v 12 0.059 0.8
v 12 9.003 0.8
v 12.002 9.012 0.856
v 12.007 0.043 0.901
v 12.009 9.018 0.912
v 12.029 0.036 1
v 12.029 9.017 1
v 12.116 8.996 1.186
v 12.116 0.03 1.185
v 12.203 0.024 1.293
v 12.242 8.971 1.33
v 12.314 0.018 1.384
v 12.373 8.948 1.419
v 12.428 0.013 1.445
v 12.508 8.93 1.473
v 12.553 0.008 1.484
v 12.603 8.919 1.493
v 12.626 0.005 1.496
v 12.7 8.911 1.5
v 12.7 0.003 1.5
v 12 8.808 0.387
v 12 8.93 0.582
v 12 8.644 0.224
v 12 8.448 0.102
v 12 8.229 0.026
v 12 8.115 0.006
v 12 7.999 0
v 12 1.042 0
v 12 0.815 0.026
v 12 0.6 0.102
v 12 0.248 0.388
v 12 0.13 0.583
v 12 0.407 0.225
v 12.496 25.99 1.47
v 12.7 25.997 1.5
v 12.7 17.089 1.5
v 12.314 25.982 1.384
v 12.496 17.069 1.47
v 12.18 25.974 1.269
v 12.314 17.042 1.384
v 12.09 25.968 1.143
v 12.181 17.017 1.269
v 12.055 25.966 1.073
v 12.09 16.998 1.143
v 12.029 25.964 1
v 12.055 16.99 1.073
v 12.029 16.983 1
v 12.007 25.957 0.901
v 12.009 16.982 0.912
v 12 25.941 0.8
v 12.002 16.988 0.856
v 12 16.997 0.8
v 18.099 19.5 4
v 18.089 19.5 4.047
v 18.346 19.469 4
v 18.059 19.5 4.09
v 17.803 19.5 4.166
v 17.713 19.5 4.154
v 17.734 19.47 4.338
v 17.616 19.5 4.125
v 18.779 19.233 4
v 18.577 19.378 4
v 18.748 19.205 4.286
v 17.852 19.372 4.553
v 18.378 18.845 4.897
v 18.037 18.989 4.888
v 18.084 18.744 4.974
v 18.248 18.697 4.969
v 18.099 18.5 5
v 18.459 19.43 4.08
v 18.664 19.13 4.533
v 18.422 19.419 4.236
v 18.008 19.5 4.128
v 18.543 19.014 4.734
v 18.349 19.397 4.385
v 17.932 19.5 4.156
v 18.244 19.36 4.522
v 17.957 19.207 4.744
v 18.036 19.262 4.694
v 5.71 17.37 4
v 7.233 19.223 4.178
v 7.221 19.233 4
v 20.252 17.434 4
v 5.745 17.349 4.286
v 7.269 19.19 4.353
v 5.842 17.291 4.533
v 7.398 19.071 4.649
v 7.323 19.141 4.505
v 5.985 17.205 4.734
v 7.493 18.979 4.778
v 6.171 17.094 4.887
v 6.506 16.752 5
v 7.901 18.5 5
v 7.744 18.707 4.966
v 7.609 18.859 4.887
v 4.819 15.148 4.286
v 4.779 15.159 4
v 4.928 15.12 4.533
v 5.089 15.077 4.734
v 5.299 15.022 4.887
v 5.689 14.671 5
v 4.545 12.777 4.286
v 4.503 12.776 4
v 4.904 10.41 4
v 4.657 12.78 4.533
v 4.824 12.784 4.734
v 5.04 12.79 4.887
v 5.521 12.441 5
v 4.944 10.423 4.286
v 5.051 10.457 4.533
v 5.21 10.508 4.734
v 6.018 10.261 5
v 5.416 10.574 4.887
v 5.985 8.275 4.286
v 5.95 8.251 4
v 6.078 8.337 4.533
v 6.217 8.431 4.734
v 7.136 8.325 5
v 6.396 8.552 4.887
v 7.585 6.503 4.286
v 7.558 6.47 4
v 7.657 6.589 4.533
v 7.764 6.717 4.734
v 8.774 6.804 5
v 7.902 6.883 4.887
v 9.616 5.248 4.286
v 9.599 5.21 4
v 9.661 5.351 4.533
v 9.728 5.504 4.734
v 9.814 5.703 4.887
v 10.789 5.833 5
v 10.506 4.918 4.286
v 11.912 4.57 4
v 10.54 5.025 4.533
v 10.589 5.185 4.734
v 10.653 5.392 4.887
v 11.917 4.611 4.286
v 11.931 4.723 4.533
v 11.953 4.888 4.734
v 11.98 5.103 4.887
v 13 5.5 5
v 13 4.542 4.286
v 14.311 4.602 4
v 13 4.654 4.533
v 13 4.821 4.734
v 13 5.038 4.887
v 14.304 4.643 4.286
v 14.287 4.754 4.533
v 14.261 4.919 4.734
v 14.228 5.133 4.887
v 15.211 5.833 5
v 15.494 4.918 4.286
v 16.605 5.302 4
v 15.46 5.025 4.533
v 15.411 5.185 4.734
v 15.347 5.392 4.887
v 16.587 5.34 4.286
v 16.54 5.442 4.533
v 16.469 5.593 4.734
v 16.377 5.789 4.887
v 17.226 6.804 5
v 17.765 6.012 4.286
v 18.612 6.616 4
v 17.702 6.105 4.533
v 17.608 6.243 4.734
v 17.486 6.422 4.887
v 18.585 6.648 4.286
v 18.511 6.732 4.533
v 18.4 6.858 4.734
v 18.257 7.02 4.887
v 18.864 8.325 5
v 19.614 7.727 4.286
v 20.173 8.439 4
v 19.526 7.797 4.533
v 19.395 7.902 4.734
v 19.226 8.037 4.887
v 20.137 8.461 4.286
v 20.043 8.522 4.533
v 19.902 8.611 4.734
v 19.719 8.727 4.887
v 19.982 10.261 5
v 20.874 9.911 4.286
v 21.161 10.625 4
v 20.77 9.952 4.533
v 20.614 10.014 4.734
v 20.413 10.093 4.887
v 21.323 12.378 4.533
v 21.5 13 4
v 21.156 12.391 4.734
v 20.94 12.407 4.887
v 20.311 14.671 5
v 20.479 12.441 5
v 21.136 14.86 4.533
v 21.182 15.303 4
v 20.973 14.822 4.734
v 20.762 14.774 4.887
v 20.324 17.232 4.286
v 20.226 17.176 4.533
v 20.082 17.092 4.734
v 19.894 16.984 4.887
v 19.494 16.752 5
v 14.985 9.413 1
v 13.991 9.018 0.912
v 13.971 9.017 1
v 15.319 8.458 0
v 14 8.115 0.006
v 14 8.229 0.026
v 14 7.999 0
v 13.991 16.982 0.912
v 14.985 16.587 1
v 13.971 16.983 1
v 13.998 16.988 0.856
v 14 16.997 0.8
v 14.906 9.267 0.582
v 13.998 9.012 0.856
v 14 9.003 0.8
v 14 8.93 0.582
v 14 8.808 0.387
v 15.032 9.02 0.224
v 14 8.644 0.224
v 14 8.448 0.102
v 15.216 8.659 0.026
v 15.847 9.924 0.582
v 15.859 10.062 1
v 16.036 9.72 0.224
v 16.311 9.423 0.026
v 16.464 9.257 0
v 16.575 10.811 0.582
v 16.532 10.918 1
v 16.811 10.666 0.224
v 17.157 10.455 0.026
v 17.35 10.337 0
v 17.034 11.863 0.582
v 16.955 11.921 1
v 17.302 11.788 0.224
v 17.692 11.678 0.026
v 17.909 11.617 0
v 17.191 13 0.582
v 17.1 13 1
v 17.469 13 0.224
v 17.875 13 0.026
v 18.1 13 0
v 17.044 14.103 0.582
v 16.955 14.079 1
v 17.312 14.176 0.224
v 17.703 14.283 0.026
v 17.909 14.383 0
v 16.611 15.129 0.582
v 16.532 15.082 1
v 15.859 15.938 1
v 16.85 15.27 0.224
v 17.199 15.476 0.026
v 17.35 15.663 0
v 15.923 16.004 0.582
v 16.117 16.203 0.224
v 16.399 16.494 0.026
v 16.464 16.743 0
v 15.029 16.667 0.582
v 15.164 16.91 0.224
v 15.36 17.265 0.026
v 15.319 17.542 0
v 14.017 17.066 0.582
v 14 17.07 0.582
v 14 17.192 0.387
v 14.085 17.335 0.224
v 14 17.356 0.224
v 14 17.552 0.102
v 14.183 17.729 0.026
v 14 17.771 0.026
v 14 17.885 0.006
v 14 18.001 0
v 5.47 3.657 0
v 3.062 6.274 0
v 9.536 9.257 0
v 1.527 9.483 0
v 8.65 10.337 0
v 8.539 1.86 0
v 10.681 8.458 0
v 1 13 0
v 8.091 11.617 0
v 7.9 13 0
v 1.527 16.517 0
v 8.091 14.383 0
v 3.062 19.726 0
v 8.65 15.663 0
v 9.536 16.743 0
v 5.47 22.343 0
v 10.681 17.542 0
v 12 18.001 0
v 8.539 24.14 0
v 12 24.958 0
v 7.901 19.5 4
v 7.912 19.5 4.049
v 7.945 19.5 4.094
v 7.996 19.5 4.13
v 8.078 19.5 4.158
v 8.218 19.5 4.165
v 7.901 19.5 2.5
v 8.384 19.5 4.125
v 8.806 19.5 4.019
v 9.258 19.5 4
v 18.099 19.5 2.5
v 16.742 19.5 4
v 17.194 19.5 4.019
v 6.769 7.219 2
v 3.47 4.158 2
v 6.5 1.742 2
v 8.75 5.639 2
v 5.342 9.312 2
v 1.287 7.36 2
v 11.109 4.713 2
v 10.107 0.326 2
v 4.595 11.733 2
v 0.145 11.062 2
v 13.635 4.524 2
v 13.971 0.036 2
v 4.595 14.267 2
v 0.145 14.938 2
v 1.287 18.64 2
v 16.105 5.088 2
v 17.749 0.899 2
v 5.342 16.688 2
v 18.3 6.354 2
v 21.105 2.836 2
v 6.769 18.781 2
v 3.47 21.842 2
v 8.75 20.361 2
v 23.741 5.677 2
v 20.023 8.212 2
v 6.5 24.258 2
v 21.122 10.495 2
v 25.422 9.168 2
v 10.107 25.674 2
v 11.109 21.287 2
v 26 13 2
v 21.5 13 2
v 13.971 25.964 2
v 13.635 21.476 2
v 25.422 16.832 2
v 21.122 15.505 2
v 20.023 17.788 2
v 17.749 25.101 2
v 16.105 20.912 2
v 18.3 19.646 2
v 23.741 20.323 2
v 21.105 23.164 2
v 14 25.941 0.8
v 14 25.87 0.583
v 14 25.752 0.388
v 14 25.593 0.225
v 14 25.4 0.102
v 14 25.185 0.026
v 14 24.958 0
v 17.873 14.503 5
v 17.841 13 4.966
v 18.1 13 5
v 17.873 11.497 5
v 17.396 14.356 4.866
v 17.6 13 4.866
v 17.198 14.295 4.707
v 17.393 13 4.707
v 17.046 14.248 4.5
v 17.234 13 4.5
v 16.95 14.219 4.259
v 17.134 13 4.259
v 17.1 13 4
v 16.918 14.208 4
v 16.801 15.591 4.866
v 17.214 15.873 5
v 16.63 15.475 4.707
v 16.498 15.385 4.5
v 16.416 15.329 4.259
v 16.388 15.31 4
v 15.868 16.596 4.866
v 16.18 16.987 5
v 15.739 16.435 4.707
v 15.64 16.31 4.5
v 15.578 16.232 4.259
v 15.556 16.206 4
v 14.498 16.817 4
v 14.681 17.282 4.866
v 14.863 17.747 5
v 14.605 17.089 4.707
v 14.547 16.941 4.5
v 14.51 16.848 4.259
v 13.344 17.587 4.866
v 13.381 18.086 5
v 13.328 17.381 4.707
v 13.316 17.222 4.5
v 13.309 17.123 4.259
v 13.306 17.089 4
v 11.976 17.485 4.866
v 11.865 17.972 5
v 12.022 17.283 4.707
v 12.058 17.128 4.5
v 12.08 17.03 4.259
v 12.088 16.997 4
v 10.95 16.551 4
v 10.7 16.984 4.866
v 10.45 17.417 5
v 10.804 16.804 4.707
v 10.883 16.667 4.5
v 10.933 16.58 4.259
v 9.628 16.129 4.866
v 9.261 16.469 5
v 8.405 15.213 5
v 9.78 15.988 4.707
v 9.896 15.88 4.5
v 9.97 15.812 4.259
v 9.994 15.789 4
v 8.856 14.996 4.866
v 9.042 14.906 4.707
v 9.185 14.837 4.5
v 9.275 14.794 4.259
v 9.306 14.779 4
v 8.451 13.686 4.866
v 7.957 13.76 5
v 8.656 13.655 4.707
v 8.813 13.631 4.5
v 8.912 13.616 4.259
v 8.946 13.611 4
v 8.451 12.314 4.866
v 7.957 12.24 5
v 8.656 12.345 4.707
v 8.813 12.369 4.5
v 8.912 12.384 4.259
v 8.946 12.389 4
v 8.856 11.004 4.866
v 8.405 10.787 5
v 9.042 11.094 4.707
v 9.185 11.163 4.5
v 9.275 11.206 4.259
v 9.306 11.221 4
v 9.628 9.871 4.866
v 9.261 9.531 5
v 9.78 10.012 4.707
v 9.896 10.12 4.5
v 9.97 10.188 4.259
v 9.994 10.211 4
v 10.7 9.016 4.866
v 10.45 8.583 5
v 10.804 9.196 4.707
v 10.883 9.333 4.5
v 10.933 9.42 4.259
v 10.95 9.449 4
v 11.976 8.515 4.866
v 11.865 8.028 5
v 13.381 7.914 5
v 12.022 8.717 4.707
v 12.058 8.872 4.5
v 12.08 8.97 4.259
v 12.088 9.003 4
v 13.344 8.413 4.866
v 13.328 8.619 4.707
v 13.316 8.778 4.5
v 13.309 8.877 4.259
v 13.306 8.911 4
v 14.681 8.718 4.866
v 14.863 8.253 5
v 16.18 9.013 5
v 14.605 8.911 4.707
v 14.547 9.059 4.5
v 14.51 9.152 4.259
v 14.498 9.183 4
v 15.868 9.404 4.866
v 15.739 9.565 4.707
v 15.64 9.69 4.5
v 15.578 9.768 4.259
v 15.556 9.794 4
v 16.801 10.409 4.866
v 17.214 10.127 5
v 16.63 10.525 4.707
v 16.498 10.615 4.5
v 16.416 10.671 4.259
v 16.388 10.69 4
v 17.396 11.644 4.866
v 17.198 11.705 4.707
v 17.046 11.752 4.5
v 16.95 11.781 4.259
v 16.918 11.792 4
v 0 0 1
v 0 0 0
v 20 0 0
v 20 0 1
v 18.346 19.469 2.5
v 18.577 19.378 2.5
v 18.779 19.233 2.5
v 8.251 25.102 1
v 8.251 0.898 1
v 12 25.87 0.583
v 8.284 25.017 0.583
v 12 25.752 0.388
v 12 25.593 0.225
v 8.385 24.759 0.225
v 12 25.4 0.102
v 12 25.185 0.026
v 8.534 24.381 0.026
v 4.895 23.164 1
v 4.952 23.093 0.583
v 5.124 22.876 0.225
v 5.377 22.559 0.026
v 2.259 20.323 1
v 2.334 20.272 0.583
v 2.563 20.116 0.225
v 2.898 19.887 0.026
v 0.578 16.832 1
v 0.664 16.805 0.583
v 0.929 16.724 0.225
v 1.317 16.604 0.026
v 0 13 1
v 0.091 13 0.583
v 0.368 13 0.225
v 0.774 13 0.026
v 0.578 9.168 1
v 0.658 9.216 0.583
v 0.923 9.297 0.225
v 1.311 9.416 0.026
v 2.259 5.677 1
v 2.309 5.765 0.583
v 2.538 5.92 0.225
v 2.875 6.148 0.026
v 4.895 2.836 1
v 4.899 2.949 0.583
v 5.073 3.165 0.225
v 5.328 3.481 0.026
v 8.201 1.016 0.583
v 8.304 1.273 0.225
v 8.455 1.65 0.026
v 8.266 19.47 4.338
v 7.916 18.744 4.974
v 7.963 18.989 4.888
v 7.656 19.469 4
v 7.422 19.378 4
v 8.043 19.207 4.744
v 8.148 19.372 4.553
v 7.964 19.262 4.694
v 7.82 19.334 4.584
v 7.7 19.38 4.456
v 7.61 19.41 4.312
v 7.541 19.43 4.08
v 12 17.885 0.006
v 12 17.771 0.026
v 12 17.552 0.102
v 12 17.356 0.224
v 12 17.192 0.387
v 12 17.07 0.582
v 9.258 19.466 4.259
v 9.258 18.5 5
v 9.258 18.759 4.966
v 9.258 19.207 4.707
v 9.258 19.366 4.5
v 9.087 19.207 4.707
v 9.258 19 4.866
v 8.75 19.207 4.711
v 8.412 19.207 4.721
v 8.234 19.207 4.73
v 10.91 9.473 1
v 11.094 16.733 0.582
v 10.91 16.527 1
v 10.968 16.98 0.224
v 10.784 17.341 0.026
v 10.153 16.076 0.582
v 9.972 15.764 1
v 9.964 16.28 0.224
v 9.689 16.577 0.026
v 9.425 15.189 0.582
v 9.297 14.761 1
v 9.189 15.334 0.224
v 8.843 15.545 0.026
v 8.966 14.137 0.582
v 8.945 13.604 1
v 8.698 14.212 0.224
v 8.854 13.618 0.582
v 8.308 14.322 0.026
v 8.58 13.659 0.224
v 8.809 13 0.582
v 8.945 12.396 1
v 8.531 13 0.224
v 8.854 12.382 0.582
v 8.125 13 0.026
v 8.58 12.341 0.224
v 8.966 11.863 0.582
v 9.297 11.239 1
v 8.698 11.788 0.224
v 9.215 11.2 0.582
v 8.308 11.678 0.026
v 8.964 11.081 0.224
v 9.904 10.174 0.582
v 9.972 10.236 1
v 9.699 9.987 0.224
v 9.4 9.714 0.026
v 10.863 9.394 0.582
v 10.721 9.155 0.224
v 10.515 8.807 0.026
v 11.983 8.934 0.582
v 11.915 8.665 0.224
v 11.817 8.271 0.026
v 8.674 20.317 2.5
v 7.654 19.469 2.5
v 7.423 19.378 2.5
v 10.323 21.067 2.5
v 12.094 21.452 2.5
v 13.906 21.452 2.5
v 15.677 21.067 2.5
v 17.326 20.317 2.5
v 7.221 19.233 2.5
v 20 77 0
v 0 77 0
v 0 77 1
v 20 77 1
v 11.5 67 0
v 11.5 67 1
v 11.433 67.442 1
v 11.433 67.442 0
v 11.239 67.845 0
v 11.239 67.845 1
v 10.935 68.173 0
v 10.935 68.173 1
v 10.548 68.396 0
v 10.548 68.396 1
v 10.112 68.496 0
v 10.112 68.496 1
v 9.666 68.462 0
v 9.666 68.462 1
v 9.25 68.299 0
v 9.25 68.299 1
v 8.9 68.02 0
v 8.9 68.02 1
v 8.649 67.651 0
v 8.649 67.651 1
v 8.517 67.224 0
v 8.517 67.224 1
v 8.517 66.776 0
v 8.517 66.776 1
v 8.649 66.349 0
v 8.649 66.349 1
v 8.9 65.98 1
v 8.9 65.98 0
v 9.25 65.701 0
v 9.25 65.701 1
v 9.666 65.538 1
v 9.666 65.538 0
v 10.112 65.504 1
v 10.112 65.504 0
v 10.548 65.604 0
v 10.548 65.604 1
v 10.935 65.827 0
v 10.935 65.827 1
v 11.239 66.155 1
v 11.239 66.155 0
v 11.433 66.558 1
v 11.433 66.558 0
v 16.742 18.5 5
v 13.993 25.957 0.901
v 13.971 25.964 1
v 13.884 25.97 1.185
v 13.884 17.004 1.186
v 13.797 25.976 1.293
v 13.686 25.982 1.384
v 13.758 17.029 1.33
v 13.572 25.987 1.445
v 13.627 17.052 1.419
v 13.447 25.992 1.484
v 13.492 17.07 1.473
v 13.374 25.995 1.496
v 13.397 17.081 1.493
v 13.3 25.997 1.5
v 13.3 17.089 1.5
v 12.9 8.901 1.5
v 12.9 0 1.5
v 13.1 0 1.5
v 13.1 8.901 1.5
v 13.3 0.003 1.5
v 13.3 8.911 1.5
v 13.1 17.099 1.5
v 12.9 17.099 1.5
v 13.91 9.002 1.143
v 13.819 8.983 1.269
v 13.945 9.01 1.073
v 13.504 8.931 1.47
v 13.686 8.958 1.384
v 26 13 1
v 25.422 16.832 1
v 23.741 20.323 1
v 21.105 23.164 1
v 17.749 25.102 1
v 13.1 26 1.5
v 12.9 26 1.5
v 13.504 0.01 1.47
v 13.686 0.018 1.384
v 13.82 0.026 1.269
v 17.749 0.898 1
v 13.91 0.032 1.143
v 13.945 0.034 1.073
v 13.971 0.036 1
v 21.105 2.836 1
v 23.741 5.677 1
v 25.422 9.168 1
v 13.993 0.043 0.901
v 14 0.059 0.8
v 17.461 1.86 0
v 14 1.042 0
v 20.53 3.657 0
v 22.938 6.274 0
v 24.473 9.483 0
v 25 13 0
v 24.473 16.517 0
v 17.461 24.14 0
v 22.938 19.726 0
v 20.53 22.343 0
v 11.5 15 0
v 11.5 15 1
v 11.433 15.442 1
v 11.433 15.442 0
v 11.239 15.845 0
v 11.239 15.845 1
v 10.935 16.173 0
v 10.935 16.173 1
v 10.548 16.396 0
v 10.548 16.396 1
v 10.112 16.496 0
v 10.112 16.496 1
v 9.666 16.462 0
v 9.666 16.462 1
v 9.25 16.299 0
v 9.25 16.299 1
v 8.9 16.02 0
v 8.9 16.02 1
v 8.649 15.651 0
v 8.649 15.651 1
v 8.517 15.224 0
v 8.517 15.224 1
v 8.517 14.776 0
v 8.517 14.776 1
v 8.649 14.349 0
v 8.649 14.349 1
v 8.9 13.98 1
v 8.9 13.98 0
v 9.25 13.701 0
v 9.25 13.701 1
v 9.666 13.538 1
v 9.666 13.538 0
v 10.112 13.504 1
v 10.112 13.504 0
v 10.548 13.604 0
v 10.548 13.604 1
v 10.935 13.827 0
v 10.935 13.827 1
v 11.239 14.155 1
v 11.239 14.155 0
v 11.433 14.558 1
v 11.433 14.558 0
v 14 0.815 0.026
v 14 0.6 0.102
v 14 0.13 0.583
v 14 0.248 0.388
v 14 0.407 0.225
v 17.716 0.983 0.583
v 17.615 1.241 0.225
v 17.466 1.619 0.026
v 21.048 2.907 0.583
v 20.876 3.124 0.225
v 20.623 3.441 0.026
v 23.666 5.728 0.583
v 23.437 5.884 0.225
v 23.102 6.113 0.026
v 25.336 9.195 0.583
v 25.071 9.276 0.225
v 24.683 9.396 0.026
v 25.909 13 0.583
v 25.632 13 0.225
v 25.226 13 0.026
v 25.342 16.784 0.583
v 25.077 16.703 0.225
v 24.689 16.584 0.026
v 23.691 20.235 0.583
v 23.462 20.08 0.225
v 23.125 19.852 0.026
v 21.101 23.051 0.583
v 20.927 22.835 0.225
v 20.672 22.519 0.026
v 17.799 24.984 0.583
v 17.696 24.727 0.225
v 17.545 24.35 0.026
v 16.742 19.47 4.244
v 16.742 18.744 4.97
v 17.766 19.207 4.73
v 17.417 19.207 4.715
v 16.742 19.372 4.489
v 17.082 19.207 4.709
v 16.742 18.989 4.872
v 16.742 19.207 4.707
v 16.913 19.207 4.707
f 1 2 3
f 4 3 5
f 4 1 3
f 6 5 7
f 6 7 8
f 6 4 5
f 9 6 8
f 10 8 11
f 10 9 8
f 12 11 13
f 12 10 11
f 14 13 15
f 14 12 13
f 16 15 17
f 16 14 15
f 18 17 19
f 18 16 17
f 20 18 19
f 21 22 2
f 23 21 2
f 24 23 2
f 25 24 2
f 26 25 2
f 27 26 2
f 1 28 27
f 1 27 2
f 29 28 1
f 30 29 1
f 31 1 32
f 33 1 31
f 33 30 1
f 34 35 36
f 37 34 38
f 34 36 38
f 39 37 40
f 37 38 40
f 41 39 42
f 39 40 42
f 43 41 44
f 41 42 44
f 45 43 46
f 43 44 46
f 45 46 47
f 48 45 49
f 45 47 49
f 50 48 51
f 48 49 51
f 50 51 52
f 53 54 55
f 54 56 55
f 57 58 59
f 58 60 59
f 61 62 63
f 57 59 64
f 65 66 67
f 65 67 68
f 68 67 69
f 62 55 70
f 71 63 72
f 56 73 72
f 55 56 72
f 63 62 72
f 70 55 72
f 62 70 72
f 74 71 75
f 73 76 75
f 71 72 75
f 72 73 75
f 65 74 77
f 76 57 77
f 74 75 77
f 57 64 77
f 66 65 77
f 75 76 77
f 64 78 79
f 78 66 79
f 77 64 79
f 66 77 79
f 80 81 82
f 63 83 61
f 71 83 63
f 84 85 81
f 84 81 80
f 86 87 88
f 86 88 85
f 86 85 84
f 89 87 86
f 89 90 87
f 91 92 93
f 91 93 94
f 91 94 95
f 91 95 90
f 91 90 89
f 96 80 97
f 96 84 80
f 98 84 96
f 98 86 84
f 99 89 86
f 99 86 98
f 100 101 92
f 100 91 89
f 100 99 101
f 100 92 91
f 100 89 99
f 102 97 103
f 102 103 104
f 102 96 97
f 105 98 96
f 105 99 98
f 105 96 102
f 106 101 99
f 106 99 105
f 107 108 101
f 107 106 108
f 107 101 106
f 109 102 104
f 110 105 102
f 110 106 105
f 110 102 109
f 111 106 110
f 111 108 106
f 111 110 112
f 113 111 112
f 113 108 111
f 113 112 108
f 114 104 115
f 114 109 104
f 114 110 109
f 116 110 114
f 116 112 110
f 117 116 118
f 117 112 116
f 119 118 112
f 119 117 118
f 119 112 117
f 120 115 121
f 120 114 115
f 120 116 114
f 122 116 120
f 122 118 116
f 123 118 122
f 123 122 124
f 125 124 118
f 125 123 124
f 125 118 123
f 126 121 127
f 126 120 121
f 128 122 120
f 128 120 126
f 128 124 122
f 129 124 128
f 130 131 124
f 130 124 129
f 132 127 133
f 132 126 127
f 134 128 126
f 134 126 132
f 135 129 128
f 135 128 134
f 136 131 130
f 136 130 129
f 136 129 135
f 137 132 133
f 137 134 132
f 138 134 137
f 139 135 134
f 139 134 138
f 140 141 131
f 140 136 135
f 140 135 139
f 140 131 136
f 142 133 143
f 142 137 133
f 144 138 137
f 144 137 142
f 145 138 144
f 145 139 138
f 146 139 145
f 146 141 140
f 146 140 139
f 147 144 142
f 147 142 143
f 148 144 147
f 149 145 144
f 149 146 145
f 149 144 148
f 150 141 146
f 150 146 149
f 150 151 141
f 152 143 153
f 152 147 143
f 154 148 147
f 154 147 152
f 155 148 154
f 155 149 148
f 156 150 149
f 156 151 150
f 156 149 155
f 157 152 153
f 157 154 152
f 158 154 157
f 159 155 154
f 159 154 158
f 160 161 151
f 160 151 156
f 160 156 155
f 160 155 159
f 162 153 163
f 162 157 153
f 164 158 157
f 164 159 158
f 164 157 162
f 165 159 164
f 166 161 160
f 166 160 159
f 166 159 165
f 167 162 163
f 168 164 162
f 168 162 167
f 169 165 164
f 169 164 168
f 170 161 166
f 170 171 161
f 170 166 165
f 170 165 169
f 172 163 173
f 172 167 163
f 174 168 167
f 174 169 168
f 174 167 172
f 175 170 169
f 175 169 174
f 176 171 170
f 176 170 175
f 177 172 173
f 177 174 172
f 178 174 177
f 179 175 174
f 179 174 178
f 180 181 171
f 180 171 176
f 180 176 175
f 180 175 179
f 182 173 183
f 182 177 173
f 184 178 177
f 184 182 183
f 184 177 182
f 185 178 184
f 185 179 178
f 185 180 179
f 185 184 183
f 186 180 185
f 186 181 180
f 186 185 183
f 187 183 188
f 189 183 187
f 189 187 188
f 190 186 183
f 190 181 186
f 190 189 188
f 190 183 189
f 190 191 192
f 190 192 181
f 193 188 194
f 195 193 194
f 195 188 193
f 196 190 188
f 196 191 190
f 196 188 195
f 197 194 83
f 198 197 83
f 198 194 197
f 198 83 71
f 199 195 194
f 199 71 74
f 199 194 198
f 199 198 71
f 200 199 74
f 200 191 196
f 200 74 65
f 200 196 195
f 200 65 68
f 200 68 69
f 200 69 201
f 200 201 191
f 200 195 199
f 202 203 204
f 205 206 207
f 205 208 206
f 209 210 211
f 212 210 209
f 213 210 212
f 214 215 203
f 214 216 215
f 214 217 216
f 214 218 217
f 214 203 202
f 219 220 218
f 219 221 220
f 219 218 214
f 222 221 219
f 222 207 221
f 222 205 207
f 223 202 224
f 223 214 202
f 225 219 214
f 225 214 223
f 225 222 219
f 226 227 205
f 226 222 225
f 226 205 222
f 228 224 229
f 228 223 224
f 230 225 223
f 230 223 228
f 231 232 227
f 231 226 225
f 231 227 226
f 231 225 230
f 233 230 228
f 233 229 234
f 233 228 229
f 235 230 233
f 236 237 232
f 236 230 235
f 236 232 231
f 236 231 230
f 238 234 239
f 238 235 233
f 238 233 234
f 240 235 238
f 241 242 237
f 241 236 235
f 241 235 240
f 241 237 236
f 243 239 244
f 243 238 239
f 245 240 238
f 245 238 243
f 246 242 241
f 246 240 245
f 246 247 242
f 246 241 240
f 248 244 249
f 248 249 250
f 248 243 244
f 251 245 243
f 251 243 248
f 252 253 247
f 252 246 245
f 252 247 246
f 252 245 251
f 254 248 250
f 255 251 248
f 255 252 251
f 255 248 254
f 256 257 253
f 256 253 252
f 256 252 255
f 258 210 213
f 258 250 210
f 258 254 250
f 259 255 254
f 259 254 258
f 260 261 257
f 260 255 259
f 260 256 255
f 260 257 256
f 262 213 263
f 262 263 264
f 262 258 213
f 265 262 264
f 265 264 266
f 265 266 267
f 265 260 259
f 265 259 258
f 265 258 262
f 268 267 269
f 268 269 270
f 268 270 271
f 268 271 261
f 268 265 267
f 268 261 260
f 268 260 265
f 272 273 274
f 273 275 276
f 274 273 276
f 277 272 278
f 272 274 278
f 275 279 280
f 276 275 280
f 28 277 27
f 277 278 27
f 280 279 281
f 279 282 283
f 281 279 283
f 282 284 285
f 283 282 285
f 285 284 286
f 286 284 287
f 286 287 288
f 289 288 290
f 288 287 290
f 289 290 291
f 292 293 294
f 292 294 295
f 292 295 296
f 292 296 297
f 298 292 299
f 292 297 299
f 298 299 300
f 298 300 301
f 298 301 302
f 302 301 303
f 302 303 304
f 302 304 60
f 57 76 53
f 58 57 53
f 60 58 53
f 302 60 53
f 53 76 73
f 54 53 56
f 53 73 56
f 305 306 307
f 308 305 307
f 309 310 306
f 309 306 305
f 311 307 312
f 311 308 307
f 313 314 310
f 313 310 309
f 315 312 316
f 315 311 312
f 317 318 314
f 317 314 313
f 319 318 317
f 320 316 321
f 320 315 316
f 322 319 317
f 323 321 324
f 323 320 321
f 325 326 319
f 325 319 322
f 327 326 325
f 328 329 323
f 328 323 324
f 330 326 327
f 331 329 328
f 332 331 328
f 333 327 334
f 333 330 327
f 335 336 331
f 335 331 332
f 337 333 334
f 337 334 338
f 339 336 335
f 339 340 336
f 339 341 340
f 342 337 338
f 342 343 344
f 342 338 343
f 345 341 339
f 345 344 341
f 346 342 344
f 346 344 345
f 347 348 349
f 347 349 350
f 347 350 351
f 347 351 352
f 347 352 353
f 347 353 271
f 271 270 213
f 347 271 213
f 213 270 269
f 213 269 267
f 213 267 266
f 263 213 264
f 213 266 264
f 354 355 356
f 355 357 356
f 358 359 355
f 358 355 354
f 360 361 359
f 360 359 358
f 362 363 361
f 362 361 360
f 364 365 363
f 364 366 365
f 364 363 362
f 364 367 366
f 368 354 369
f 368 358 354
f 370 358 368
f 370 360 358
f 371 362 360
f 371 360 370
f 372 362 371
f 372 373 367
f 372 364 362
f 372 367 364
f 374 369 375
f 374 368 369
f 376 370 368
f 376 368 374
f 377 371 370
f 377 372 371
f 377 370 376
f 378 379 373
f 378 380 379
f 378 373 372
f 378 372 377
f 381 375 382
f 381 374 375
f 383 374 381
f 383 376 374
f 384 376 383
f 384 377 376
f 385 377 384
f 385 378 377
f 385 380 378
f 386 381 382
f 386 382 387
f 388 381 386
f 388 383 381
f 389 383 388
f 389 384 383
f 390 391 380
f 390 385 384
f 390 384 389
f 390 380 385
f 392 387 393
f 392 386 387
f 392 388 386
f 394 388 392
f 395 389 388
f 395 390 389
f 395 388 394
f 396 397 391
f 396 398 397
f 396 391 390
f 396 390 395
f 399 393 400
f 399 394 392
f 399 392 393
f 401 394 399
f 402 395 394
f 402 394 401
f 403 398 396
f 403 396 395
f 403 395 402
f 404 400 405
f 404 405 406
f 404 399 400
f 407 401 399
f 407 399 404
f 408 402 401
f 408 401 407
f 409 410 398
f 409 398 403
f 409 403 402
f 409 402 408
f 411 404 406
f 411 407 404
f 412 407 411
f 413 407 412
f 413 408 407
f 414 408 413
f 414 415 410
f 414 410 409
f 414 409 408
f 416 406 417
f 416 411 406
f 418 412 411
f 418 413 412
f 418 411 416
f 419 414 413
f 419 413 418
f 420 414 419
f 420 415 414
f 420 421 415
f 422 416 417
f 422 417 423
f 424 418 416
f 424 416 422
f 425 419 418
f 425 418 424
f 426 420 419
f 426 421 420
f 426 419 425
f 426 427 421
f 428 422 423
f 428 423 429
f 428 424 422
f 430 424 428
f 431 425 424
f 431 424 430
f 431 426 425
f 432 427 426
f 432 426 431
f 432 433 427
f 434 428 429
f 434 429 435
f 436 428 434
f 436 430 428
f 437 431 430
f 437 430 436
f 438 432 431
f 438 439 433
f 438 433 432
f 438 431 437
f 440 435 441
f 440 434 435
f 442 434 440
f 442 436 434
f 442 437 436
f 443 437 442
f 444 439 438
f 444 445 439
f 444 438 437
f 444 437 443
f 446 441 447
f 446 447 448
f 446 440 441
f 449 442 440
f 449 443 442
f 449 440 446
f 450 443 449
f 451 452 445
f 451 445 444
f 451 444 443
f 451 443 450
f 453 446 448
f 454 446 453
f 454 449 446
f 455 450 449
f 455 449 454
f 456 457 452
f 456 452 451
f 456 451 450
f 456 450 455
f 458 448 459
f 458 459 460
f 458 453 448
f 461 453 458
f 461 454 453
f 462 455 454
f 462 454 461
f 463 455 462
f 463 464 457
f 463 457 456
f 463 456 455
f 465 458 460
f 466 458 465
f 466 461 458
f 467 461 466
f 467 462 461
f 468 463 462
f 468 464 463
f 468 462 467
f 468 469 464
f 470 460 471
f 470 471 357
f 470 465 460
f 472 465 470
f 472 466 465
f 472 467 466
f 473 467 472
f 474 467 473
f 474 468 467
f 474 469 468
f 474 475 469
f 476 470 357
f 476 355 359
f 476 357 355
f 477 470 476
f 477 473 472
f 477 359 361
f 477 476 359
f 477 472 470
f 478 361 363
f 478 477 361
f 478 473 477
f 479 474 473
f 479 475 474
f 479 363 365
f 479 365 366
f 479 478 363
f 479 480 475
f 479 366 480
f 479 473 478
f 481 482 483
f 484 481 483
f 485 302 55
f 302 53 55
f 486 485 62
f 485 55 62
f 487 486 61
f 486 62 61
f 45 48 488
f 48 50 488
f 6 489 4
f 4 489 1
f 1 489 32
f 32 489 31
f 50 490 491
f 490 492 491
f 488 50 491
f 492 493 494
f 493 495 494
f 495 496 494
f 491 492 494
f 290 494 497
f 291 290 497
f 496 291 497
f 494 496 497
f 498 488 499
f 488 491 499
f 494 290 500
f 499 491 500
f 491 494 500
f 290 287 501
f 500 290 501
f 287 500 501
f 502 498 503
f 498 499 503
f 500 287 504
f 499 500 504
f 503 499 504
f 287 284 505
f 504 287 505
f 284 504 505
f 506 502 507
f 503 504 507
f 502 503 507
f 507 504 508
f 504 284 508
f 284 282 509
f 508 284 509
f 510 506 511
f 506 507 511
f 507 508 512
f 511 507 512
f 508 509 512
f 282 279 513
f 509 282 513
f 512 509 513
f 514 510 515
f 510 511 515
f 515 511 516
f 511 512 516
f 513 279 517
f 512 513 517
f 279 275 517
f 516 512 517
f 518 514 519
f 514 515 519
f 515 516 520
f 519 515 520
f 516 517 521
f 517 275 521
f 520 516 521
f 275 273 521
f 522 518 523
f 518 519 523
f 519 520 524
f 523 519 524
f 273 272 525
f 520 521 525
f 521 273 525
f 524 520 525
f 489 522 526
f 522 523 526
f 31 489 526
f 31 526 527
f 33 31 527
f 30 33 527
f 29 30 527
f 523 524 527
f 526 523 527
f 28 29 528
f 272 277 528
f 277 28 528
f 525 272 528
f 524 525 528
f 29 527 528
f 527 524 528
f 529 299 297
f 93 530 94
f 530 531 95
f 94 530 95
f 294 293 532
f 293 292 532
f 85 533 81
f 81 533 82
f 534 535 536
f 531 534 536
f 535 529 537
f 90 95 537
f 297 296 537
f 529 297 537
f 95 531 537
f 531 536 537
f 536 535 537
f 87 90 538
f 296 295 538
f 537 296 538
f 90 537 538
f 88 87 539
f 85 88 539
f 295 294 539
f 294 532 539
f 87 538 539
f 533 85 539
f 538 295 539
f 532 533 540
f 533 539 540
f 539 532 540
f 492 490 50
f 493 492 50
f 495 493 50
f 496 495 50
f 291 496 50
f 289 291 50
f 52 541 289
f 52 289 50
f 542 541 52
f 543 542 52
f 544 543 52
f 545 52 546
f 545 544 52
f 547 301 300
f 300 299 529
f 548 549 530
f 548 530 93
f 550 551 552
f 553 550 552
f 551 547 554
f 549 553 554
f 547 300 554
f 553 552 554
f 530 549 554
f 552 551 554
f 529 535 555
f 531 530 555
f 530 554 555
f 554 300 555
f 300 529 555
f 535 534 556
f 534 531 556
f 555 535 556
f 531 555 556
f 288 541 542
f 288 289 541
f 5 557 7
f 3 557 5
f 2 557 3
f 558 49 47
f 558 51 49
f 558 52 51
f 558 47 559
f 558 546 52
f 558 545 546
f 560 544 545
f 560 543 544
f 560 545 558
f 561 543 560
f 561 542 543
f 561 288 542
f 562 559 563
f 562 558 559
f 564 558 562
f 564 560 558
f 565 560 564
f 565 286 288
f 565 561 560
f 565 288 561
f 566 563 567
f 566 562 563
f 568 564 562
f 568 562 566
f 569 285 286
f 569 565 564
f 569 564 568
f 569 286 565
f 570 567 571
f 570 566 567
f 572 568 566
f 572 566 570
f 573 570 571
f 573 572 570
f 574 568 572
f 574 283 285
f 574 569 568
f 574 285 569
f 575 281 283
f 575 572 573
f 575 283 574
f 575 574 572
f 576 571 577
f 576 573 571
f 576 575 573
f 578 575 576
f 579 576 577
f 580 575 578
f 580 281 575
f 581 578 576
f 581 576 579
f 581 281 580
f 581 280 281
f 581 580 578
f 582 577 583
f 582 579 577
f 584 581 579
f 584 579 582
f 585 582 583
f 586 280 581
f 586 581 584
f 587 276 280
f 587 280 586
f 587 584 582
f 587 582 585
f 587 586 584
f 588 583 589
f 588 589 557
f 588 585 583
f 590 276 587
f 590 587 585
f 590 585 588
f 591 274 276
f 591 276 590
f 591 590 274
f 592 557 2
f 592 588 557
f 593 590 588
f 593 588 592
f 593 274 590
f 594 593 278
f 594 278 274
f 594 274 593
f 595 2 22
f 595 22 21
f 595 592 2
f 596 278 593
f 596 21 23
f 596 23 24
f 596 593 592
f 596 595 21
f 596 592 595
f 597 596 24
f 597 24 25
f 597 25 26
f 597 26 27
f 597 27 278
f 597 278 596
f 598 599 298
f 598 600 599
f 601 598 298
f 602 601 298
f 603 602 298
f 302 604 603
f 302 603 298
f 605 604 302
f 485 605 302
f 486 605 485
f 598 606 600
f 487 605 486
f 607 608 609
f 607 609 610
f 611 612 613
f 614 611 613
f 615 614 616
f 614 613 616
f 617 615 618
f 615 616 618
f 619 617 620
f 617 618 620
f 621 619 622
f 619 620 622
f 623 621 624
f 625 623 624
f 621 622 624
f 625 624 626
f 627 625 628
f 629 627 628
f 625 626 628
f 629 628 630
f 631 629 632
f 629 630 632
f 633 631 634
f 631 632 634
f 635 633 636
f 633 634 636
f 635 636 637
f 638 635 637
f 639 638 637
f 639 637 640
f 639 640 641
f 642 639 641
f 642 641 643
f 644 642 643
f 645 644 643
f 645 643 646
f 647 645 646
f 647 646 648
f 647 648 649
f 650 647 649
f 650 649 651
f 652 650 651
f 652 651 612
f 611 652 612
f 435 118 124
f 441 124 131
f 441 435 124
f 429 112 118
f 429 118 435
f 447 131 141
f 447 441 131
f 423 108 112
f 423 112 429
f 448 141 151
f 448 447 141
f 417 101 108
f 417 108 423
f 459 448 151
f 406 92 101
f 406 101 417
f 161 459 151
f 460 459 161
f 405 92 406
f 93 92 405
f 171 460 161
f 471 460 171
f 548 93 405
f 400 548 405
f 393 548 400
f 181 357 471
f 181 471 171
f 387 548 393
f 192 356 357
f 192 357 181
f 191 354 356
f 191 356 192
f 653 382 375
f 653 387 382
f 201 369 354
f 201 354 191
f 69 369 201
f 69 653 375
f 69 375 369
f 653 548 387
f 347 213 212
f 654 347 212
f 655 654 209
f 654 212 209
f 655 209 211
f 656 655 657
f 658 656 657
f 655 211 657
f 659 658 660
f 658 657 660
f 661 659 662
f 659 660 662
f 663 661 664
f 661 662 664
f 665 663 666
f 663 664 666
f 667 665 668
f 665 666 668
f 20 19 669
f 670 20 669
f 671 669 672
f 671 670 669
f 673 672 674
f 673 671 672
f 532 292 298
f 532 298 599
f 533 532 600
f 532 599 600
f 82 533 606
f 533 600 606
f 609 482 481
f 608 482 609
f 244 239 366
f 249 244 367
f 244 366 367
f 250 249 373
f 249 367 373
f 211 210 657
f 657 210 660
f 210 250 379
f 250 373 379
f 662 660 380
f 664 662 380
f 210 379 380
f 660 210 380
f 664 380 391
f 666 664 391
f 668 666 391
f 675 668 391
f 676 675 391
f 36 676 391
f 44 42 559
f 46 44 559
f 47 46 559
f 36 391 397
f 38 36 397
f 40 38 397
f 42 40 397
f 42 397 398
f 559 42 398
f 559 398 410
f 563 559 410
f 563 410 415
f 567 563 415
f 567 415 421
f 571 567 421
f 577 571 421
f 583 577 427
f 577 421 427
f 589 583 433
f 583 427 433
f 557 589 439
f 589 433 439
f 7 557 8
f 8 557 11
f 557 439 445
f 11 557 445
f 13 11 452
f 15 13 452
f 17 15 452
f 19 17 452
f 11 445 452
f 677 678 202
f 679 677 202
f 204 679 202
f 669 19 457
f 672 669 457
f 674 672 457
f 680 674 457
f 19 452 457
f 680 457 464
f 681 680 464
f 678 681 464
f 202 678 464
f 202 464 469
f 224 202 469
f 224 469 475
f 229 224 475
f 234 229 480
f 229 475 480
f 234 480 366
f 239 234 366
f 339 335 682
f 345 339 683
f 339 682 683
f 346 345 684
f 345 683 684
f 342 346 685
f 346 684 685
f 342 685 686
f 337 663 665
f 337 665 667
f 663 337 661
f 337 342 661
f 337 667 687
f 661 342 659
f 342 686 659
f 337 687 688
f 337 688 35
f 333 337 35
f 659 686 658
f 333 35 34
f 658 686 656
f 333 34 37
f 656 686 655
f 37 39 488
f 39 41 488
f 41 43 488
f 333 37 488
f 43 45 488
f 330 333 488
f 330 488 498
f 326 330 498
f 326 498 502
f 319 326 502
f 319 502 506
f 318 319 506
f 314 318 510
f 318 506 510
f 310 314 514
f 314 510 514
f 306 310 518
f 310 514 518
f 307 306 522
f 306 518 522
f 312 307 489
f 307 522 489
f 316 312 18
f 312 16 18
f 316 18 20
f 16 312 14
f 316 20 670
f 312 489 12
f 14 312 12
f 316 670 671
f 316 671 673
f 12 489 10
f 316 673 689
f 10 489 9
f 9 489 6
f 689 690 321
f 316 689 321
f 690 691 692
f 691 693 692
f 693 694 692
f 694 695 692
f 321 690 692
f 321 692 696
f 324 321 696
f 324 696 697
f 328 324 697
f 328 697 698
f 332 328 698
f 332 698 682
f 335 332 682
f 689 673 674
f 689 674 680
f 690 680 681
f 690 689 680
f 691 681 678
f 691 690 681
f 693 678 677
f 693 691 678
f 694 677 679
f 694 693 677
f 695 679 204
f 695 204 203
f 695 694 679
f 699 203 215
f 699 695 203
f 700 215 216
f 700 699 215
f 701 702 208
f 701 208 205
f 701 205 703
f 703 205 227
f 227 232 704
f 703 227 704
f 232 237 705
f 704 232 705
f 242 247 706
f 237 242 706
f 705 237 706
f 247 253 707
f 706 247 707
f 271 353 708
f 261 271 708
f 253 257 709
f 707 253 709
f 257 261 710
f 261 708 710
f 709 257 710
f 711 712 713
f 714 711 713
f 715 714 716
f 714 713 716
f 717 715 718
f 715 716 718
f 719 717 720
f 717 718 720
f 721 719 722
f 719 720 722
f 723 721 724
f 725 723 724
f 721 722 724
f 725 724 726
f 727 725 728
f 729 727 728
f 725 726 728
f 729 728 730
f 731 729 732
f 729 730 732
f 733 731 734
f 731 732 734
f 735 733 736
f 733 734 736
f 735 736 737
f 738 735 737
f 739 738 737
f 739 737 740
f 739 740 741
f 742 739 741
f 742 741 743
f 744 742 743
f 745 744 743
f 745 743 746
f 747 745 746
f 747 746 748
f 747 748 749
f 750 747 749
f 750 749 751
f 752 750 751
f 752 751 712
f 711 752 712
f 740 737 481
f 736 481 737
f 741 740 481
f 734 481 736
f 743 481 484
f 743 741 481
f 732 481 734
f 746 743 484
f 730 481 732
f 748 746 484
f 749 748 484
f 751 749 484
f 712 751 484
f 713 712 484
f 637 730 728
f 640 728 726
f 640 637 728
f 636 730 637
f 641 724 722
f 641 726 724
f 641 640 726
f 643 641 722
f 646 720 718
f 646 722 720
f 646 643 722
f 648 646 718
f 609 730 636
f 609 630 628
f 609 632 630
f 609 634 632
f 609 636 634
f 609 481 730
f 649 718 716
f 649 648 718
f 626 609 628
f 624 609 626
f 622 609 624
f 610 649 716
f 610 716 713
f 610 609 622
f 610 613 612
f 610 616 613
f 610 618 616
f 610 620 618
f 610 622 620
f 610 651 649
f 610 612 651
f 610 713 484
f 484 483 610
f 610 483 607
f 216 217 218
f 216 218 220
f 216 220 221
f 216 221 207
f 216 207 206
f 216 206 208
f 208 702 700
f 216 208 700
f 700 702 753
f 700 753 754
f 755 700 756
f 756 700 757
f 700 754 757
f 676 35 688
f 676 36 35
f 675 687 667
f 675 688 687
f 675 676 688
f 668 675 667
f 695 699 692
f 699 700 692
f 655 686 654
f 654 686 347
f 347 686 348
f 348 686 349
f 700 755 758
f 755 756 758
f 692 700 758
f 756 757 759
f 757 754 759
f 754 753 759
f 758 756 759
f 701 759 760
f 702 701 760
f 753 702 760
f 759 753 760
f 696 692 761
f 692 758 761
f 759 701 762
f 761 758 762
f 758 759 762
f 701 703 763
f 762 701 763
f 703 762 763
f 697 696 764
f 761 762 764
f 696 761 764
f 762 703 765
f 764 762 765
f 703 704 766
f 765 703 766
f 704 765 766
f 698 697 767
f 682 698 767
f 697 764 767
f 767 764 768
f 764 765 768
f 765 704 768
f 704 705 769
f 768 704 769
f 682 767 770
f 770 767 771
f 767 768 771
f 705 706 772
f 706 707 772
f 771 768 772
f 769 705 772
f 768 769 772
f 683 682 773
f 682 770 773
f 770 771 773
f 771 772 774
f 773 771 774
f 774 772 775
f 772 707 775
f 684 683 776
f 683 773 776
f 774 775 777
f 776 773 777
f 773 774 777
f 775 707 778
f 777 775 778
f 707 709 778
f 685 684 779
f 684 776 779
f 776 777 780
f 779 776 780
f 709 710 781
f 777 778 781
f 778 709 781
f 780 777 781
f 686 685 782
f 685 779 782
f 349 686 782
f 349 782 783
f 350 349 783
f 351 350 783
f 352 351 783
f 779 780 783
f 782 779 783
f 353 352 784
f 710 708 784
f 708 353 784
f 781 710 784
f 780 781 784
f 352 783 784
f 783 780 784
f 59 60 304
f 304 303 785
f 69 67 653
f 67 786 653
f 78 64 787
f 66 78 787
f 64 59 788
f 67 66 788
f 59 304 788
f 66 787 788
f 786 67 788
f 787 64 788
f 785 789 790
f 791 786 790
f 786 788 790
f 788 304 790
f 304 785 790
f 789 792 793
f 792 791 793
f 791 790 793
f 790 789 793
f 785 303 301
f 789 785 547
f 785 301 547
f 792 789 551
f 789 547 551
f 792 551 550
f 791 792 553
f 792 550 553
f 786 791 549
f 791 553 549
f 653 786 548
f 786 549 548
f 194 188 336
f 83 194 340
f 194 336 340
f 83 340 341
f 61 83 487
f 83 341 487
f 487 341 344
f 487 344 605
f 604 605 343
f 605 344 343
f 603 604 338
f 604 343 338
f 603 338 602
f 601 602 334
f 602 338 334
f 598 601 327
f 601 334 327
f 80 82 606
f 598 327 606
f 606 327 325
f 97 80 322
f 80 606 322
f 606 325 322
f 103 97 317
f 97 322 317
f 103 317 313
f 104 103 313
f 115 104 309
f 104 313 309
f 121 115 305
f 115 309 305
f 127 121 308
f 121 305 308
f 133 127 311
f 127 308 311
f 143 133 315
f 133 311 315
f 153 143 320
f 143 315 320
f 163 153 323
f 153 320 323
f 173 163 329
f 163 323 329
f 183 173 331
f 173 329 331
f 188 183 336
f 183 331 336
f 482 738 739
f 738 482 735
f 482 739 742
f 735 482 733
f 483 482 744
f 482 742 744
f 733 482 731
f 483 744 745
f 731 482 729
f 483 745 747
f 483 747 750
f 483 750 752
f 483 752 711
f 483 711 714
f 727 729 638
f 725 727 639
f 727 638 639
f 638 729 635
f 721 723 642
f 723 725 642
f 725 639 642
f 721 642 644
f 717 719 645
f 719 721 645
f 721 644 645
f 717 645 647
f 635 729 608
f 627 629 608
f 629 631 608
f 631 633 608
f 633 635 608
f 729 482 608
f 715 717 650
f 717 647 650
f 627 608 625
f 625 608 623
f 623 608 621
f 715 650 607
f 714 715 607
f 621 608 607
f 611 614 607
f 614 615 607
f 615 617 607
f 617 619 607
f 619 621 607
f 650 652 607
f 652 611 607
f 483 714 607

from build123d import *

# Parameters (mm, degrees)
SKETCH_R        = 13
PAD_DEPTH       = 2
SKETCH001_R     = 8.5
PAD001_DEPTH    = 3
SKETCH002_R     = 4.1
POCKET_DEPTH    = 5
SKETCH003_W     = 18
SKETCH003_H     = 2.164
POCKET001_DEPTH = 2.5
SKETCH004_W     = 2
SKETCH004_H     = 26
POCKET002_DEPTH = 1.5
FILLET_R        = 0.7
FILLET001_R     = 0.7
FILLET002_R     = 1
FILLET003_R     = 1
FILLET004_R     = 1
FILLET005_R     = 1
FILLET006_R     = 1
SKETCH005_W     = 20
SKETCH005_H     = 77
PAD002_DEPTH    = 1
SKETCH006_R     = 1.5
POCKET003_DEPTH = 1.001


with BuildPart() as body:
    # Sketch → Pad (new body)
    with BuildSketch(Plane.XY):
        with Locations((13, 13)):
            Circle(SKETCH_R)
    extrude(amount=PAD_DEPTH)

    # Sketch001 (on Face3 of Pad) → Pad001 (join)
    with BuildSketch(Plane.XY.offset(2)):
        with Locations((13, 13)):
            Circle(SKETCH001_R)
    extrude(amount=PAD001_DEPTH)

    # Sketch002 (on Face5 of Pad001) → Pocket (cut)
    with BuildSketch(Plane.XY.offset(5)):
        with Locations((13, 13)):
            Circle(SKETCH002_R)
    extrude(amount=-POCKET_DEPTH, mode=Mode.SUBTRACT)

    # Sketch003 (on Face6 of Pocket) → Pocket001 (cut)
    with BuildSketch(Plane.XY.offset(5)):
        with Locations((13, 20.582)):
            Rectangle(SKETCH003_W, SKETCH003_H)
    extrude(amount=-POCKET001_DEPTH, mode=Mode.SUBTRACT)

    # Sketch004 (on Face2 of Pocket001) → Pocket002 (cut)
    with BuildSketch(Plane(origin=(0, 0, 0), x_dir=(1, 0, 0), z_dir=(0, 0, -1))):
        with Locations((13, -13)):
            Rectangle(SKETCH004_W, SKETCH004_H)
    extrude(amount=-POCKET002_DEPTH, mode=Mode.SUBTRACT)

    # Fillet
    fillet_edges = [body.edges().sort_by_distance(p)[0] for p in [
        (14, 21.46883, 1.5),
        (12, 21.46883, 1.5),
    ]]
    fillet(fillet_edges, radius=FILLET_R)

    # Fillet001
    fillet001_edges = [body.edges().sort_by_distance(p)[0] for p in [
        (12, 4.53117, 1.5),
        (14, 4.53117, 1.5),
    ]]
    fillet(fillet001_edges, radius=FILLET001_R)

    # Fillet002
    fillet002_edges = [body.edges().sort_by_distance(p)[0] for p in [
        (22.539392, 21.831761, 0),
        (0, 13, 0),
    ]]
    fillet(fillet002_edges, radius=FILLET002_R)

    # Fillet003
    fillet003_edges = [body.edges().sort_by_distance(p)[0] for p in [
        (20.707348, 16.584242, 5),
        (9.415758, 5.292652, 5),
    ]]
    fillet(fillet003_edges, radius=FILLET003_R)

    # Fillet004
    fillet004_edges = [body.edges().sort_by_distance(p)[0] for p in [
        (8.9, 13, 5),
    ]]
    fillet(fillet004_edges, radius=FILLET004_R)

    # Fillet005
    fillet005_edges = [body.edges().sort_by_distance(p)[0] for p in [
        (17.818835, 19.5, 4.806359),
        (8.181165, 19.5, 4.806359),
        (13, 19.5, 5),
    ]]
    fillet(fillet005_edges, radius=FILLET005_R)

    # Fillet006
    fillet006_edges = [body.edges().sort_by_distance(p)[0] for p in [
        (8.9, 13, 0),
        (16.233419, 10.479087, 0),
        (16.233419, 15.520913, 0),
    ]]
    fillet(fillet006_edges, radius=FILLET006_R)


with BuildPart() as body001:
    # Sketch005 → Pad002 (new body)
    with BuildSketch(Plane.XY):
        with Locations((10, 38.5)):
            Rectangle(SKETCH005_W, SKETCH005_H)
    extrude(amount=PAD002_DEPTH)

    # Sketch006 (on Face6 of Pad002) → Pocket003 (cut, through all)
    with BuildSketch(Plane.XY.offset(1)):
        with Locations((10, 67)):
            Circle(SKETCH006_R)
        with Locations((10, 15)):
            Circle(SKETCH006_R)
    extrude(amount=-POCKET003_DEPTH, mode=Mode.SUBTRACT)


solid = Compound([body.part, body001.part])
